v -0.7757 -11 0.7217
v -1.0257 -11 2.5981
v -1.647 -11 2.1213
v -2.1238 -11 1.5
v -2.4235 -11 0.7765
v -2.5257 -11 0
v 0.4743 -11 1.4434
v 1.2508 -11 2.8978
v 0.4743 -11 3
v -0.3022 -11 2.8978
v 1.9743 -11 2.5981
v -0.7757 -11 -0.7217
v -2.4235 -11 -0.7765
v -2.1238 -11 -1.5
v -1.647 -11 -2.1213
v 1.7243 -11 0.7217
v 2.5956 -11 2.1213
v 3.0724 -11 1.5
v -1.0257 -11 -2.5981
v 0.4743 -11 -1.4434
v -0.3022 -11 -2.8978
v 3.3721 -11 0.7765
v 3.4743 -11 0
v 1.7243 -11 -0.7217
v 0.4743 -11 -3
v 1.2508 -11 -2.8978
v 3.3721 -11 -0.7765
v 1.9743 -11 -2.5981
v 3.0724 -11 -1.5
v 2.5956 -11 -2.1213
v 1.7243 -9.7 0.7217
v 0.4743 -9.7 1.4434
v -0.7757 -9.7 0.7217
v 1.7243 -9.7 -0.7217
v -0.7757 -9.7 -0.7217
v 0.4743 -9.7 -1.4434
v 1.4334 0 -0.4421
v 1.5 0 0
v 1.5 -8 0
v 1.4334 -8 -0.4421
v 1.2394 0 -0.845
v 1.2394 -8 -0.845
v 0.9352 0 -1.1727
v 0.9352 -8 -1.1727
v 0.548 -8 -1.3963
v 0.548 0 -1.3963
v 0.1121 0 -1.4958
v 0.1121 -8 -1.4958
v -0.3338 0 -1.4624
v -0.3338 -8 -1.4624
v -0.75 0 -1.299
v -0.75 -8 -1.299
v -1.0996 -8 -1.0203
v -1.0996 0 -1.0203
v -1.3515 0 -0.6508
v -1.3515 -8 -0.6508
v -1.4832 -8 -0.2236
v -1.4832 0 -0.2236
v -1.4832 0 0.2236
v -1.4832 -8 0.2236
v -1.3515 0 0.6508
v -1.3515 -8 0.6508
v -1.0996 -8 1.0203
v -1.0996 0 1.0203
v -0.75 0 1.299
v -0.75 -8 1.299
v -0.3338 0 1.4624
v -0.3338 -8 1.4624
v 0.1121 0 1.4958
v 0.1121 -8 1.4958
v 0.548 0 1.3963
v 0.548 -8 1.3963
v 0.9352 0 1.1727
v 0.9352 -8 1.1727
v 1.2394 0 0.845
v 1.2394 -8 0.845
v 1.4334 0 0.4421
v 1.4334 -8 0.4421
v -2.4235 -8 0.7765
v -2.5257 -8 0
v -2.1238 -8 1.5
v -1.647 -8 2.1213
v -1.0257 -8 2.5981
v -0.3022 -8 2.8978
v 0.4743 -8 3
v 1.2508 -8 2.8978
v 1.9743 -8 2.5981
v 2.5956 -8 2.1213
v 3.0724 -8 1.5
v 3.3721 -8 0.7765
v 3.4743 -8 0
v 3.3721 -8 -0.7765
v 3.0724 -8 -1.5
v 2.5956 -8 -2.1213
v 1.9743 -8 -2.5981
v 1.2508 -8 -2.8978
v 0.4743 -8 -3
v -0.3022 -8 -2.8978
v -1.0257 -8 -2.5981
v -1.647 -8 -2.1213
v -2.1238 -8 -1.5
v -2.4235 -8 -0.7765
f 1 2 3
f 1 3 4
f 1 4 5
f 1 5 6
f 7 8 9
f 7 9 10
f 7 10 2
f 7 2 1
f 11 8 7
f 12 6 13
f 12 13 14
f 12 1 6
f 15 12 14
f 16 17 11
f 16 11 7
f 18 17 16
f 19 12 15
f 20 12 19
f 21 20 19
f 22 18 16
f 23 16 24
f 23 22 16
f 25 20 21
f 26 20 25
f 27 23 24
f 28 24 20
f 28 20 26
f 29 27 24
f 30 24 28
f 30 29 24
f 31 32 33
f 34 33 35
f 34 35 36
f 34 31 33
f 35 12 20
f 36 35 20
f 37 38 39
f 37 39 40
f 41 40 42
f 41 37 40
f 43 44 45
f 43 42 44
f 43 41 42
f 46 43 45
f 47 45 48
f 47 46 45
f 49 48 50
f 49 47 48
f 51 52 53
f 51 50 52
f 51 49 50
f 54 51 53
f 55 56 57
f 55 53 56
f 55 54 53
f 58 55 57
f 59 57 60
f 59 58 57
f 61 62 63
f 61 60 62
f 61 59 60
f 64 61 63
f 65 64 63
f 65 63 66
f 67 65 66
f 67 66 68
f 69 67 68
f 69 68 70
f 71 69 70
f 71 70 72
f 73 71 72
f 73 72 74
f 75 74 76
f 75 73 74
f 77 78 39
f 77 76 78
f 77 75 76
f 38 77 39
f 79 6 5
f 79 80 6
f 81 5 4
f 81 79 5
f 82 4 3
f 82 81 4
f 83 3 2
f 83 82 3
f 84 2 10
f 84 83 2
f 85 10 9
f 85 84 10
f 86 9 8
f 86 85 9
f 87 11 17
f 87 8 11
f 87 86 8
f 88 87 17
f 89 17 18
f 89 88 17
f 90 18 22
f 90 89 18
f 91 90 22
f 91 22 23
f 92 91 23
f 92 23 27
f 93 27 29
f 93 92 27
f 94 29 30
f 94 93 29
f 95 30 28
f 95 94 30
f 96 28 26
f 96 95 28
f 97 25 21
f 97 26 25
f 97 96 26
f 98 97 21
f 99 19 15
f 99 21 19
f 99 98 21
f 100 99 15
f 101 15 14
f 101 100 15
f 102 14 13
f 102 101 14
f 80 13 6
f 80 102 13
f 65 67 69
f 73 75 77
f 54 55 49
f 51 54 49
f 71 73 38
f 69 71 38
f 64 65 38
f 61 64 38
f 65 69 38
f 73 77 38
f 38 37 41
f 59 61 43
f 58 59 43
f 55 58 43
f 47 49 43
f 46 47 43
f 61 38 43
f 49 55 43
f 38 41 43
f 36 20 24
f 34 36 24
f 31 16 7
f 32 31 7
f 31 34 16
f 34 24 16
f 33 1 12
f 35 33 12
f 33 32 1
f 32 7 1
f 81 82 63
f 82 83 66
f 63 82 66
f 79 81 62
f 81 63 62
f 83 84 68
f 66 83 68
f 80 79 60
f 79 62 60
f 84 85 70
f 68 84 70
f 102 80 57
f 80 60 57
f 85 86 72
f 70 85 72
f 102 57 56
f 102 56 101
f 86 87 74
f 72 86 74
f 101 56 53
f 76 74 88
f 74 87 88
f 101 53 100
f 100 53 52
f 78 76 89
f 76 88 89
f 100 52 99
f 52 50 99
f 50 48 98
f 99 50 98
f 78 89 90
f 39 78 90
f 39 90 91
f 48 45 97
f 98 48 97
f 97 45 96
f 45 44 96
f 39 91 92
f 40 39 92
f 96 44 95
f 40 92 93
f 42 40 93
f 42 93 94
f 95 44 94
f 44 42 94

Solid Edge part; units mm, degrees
sketch "Sketch1" plane through (0, 0, 0) normal (0, -1, 0) x (1, 0, 0)
  circle A0 centre (0, 0) radius 1.5
extrude "Protrusion1" add sketch "Sketch1" along normal blind 8
sketch "Sketch2" plane through (0, -8, 0) normal (0, -1, 0) x (-1, 0, 0)
  circle A0 centre (-0.4743, 0) radius 3
extrude "ExtrudedProtrusion_2" add sketch "Sketch2" along normal blind 3
sketch "Sketch3" plane through (0, -11, 0) normal (0, -1, 0) x (1, 0, 0)
  line L0 (1.7243, -0.7217) -> (1.7243, 0.7217)
  line L1 (1.7243, 0.7217) -> (0.4743, 1.4434)
  line L2 (0.4743, 1.4434) -> (-0.7757, 0.7217)
  line L3 (-0.7757, 0.7217) -> (-0.7757, -0.7217)
  line L4 (-0.7757, -0.7217) -> (0.4743, -1.4434)
  line L5 (0.4743, -1.4434) -> (1.7243, -0.7217)
  dimension "D1" = 2.5
extrude "ExtrudedCutout_2" cut sketch "Sketch3" against normal blind 1.3
properties material "Nylon, general purpose"
